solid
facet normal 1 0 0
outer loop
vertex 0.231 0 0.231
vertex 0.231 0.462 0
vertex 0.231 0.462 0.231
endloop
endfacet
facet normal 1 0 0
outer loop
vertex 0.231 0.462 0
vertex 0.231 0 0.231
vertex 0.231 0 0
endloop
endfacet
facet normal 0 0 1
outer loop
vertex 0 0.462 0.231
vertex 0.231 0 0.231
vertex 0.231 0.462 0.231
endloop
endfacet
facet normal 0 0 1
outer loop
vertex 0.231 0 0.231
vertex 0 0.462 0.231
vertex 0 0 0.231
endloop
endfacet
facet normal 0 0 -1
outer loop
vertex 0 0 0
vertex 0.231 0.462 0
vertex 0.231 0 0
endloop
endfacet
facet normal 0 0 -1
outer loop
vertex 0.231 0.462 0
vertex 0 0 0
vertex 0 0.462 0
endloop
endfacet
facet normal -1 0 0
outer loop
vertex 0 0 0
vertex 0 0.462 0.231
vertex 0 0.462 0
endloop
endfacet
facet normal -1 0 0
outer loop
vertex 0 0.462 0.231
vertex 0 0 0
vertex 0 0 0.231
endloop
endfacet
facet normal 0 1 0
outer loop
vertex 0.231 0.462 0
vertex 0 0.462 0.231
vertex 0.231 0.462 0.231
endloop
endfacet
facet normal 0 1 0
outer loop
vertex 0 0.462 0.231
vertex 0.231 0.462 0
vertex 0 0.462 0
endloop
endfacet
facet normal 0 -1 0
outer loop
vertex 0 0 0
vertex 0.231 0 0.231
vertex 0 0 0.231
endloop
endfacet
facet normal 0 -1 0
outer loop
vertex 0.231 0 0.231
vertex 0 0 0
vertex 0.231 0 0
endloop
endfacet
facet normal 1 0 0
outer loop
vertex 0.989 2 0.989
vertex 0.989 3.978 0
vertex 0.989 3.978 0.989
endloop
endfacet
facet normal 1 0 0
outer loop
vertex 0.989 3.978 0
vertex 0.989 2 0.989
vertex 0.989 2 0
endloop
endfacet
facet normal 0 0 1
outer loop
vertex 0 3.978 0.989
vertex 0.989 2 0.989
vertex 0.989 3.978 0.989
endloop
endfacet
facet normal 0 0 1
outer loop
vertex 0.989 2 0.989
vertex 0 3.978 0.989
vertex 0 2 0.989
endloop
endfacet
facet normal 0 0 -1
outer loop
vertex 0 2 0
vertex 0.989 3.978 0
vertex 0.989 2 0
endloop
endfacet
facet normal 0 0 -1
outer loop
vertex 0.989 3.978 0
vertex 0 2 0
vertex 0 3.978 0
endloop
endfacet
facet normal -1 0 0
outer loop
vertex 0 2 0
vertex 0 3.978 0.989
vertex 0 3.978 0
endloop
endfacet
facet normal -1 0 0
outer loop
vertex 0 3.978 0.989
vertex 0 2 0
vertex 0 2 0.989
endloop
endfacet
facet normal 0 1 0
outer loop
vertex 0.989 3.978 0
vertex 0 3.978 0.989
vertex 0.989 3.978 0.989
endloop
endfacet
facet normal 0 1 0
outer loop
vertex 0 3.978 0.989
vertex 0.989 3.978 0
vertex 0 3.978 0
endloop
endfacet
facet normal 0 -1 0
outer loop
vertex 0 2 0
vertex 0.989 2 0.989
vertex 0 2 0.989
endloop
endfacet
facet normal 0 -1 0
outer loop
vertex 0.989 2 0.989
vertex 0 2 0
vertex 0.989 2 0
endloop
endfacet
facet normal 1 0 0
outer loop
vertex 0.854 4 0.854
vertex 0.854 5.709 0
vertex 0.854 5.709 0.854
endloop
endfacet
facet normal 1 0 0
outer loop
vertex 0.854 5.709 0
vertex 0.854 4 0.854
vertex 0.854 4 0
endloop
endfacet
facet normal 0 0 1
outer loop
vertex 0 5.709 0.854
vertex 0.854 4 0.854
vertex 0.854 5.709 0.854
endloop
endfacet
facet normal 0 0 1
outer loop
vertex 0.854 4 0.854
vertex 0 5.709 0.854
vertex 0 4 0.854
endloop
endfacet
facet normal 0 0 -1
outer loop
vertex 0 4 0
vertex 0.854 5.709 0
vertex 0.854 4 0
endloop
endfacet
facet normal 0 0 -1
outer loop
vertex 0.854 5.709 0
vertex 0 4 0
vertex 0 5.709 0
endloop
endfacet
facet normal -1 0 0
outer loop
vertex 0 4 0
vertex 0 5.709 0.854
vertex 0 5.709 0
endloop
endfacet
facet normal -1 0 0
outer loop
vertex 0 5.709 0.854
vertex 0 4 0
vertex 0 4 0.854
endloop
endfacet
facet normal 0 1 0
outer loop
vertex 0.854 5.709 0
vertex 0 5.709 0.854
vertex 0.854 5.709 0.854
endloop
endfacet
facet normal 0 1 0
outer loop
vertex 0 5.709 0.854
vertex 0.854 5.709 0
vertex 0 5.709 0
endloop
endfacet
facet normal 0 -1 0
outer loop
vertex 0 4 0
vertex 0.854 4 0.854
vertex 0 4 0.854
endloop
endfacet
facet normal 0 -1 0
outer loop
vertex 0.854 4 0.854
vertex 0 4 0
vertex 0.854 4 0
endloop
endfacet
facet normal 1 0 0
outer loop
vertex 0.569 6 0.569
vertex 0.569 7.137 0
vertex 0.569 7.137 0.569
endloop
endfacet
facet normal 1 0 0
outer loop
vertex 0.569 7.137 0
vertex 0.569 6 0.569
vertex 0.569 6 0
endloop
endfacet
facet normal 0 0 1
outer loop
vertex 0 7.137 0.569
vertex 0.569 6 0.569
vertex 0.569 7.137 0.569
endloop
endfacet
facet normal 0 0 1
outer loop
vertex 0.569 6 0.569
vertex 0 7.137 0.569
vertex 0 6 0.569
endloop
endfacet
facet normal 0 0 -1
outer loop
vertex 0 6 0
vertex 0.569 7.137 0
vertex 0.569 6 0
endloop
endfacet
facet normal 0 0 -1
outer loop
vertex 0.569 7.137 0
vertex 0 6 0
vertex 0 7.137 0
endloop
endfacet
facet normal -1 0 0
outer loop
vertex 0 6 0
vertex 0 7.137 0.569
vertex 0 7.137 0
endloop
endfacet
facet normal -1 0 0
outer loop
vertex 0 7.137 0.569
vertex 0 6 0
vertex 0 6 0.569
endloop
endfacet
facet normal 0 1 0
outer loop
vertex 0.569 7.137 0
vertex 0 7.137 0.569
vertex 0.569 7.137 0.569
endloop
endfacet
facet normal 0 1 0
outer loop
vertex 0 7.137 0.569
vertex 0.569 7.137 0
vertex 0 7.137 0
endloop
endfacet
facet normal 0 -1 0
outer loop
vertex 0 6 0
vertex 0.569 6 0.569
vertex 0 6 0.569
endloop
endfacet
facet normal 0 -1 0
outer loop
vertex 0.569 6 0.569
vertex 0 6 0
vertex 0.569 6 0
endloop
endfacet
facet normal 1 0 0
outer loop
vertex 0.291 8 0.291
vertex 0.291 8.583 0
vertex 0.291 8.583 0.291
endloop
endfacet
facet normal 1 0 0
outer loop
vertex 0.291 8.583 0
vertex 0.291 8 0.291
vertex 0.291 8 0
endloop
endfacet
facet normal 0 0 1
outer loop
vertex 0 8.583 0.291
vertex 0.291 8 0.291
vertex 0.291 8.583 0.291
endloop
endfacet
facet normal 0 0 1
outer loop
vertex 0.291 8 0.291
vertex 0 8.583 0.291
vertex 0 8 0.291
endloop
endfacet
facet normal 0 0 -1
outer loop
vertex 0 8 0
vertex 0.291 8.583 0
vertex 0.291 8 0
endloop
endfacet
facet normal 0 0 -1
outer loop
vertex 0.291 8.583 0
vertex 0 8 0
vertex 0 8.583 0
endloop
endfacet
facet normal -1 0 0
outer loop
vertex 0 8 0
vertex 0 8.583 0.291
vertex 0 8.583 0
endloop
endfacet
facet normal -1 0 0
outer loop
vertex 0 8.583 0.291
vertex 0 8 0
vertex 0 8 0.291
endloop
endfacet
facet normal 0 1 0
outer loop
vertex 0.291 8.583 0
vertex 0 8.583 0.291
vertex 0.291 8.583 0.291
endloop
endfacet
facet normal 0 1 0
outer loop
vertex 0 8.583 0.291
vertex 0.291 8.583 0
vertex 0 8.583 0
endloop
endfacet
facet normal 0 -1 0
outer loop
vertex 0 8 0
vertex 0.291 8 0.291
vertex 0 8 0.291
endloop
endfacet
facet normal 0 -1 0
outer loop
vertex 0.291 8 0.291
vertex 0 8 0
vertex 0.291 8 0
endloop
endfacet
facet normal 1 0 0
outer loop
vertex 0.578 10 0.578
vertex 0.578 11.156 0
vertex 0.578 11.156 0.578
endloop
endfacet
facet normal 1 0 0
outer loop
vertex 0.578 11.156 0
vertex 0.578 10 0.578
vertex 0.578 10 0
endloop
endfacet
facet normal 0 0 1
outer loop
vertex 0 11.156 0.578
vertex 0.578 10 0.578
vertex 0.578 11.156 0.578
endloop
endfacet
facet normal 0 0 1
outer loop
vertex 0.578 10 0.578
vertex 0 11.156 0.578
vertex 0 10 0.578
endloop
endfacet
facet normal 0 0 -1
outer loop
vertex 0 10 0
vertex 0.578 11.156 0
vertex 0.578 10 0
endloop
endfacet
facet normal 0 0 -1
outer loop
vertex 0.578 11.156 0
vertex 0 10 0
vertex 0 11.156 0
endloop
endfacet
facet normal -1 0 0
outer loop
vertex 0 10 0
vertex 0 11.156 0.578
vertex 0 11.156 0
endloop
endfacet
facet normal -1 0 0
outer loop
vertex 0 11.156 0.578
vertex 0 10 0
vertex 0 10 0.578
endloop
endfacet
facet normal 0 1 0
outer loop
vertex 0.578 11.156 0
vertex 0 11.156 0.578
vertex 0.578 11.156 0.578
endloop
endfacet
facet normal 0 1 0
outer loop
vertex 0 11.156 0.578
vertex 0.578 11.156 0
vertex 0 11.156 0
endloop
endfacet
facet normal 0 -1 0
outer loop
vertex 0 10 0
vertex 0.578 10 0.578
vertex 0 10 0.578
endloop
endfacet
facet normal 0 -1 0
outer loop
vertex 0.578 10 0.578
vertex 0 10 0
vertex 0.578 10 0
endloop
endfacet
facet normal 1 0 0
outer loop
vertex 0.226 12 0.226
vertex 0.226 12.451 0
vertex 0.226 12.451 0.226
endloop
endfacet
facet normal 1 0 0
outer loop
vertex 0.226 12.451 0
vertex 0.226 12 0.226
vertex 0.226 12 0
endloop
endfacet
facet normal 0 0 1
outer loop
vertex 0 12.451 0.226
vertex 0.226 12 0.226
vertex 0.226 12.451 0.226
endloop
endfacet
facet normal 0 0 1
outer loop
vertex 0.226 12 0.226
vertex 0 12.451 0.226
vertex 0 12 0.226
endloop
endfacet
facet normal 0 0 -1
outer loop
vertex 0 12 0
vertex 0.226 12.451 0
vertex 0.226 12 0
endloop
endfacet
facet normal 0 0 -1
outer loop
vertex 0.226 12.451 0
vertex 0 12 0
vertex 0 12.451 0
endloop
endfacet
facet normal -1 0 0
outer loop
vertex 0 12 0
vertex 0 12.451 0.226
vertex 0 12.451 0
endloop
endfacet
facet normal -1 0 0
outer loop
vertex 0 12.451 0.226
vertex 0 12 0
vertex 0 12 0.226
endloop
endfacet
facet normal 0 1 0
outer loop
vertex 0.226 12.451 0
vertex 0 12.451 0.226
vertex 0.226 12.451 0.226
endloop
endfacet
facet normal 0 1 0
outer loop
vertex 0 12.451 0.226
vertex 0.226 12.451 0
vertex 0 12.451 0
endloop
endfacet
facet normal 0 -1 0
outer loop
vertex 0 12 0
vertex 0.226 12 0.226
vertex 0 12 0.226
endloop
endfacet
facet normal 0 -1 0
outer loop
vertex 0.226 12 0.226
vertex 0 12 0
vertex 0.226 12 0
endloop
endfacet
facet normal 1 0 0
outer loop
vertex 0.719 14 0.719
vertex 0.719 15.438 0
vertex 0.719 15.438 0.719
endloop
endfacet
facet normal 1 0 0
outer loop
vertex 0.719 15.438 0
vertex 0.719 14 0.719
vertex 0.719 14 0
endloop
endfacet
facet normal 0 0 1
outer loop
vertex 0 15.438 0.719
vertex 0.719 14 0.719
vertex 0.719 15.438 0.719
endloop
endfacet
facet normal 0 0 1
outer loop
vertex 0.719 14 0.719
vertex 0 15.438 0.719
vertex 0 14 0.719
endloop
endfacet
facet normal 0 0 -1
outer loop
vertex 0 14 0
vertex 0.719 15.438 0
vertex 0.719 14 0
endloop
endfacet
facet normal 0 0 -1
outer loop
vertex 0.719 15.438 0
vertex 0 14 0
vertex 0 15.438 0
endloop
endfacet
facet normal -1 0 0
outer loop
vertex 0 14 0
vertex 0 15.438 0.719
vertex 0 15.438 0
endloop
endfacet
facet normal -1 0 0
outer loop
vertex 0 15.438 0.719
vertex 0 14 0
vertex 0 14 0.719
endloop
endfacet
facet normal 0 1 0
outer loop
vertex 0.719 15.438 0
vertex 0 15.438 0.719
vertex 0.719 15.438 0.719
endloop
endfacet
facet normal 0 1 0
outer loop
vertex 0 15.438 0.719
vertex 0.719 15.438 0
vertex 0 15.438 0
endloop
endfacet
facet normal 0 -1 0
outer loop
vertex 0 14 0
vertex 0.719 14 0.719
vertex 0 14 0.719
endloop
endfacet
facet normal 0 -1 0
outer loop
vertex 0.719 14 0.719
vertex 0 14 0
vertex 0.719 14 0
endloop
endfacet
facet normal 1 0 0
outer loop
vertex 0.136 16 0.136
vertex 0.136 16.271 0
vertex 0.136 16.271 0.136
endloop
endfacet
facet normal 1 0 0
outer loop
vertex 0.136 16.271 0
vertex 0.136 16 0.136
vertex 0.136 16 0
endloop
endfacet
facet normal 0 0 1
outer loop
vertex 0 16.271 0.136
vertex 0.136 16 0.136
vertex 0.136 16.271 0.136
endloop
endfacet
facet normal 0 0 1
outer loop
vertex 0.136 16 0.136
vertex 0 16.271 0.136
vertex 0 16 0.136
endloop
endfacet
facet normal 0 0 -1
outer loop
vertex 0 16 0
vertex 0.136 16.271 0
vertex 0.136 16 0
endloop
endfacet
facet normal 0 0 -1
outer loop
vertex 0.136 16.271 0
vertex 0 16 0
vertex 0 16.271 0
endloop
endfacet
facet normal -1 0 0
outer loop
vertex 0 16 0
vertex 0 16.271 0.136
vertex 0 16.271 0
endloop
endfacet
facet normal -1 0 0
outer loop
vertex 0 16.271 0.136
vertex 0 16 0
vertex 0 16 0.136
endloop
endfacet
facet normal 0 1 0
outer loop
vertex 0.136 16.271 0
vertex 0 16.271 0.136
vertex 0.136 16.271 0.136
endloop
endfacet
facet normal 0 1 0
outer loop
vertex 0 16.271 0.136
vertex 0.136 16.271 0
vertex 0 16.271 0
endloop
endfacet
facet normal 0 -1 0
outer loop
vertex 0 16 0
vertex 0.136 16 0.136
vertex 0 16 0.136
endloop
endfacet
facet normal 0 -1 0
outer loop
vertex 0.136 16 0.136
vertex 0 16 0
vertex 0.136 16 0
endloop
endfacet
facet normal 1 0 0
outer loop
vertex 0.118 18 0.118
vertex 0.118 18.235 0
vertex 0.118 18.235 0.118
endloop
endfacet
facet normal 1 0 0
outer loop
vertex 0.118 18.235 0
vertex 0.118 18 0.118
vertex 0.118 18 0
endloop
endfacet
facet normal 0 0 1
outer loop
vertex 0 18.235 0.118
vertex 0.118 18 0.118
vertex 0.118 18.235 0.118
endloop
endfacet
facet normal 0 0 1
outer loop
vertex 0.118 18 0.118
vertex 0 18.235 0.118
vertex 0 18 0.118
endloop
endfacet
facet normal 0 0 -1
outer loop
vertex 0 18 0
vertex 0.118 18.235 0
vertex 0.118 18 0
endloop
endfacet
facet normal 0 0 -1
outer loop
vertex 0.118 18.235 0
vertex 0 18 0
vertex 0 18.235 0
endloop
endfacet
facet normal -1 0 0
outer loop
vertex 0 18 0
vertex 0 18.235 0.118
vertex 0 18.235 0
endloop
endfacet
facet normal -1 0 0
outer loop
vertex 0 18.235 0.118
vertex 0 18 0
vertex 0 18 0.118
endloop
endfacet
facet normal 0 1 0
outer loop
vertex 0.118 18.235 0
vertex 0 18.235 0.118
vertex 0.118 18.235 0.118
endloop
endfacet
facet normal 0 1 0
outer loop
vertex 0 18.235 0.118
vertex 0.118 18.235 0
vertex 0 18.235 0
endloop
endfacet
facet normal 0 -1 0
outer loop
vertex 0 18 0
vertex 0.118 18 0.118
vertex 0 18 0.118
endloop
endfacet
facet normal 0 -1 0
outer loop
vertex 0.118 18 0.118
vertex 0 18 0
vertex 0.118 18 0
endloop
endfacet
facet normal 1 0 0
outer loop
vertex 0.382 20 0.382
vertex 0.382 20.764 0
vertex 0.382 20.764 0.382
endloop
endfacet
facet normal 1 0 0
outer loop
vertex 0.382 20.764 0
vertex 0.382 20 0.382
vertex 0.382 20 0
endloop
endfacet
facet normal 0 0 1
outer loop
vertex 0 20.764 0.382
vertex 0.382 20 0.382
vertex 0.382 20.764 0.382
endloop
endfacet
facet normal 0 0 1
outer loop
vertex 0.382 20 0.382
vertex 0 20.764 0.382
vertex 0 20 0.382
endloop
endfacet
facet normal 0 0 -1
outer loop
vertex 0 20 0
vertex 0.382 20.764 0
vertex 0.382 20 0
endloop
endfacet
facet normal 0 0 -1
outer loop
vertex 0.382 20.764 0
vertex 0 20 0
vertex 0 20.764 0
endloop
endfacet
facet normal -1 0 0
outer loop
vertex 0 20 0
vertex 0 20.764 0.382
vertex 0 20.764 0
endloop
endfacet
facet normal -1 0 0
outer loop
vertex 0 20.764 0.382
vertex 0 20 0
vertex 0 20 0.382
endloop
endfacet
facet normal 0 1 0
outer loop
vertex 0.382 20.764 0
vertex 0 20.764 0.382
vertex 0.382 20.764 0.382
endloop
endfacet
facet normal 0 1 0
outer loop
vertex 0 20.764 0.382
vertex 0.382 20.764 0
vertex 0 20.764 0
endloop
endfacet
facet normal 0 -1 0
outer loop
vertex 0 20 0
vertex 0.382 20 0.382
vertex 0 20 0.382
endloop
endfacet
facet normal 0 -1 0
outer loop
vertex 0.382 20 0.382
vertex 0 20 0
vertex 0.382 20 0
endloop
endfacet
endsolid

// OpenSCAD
// ==============================================
// = Generic Brick                              =
// = Jacob Loss                                 =
// = 02/12/2022                                 =
// = GNU GPLv3.0                                =
// ==============================================

// Generic Brick to be used as a template for the future
module brick_generic(
    size,
    rand = true,
    seed
    ){

    // Undefined global protection
    // These only sometimes work?
    size = is_undef(size) ? $bs     : size;
    seed = is_undef(seed) ? $seed   : seed;
    
    r       = 1;
    r_min   = 0;
    r_max   = 1;
    r_val   = rands(r_min, r_max, r, seed);

    if($d){                                                 // Debug mode (just a cube)
        cube(size);
    } else {                                                // Run mode 
        intersection(){
           
            union(){                                        // Where the magic happens
                r_size = rand ? size * r_val[0] : size;     // Randomly scale brick [0, 1]
                cube(r_size, center=false);
            }

            cube(size);                                     // Cut brick so it is always smaller than size
        }        

    }
}

module _OSBK_test_suite(){
    $d = false;
    $bs = [1, 2, 1];
    r_vals = rands(0, 10000, 11, 1234);
    
    for(i = [0 : 10]){
         
        $seed = r_vals[i];
        
        translate([0, i * 2, 0])
        children(0);
    }

}

module _OSBK_test_brick_generic(){
    _OSBK_test_suite()
    brick_generic();
}
_OSBK_test_brick_generic();
